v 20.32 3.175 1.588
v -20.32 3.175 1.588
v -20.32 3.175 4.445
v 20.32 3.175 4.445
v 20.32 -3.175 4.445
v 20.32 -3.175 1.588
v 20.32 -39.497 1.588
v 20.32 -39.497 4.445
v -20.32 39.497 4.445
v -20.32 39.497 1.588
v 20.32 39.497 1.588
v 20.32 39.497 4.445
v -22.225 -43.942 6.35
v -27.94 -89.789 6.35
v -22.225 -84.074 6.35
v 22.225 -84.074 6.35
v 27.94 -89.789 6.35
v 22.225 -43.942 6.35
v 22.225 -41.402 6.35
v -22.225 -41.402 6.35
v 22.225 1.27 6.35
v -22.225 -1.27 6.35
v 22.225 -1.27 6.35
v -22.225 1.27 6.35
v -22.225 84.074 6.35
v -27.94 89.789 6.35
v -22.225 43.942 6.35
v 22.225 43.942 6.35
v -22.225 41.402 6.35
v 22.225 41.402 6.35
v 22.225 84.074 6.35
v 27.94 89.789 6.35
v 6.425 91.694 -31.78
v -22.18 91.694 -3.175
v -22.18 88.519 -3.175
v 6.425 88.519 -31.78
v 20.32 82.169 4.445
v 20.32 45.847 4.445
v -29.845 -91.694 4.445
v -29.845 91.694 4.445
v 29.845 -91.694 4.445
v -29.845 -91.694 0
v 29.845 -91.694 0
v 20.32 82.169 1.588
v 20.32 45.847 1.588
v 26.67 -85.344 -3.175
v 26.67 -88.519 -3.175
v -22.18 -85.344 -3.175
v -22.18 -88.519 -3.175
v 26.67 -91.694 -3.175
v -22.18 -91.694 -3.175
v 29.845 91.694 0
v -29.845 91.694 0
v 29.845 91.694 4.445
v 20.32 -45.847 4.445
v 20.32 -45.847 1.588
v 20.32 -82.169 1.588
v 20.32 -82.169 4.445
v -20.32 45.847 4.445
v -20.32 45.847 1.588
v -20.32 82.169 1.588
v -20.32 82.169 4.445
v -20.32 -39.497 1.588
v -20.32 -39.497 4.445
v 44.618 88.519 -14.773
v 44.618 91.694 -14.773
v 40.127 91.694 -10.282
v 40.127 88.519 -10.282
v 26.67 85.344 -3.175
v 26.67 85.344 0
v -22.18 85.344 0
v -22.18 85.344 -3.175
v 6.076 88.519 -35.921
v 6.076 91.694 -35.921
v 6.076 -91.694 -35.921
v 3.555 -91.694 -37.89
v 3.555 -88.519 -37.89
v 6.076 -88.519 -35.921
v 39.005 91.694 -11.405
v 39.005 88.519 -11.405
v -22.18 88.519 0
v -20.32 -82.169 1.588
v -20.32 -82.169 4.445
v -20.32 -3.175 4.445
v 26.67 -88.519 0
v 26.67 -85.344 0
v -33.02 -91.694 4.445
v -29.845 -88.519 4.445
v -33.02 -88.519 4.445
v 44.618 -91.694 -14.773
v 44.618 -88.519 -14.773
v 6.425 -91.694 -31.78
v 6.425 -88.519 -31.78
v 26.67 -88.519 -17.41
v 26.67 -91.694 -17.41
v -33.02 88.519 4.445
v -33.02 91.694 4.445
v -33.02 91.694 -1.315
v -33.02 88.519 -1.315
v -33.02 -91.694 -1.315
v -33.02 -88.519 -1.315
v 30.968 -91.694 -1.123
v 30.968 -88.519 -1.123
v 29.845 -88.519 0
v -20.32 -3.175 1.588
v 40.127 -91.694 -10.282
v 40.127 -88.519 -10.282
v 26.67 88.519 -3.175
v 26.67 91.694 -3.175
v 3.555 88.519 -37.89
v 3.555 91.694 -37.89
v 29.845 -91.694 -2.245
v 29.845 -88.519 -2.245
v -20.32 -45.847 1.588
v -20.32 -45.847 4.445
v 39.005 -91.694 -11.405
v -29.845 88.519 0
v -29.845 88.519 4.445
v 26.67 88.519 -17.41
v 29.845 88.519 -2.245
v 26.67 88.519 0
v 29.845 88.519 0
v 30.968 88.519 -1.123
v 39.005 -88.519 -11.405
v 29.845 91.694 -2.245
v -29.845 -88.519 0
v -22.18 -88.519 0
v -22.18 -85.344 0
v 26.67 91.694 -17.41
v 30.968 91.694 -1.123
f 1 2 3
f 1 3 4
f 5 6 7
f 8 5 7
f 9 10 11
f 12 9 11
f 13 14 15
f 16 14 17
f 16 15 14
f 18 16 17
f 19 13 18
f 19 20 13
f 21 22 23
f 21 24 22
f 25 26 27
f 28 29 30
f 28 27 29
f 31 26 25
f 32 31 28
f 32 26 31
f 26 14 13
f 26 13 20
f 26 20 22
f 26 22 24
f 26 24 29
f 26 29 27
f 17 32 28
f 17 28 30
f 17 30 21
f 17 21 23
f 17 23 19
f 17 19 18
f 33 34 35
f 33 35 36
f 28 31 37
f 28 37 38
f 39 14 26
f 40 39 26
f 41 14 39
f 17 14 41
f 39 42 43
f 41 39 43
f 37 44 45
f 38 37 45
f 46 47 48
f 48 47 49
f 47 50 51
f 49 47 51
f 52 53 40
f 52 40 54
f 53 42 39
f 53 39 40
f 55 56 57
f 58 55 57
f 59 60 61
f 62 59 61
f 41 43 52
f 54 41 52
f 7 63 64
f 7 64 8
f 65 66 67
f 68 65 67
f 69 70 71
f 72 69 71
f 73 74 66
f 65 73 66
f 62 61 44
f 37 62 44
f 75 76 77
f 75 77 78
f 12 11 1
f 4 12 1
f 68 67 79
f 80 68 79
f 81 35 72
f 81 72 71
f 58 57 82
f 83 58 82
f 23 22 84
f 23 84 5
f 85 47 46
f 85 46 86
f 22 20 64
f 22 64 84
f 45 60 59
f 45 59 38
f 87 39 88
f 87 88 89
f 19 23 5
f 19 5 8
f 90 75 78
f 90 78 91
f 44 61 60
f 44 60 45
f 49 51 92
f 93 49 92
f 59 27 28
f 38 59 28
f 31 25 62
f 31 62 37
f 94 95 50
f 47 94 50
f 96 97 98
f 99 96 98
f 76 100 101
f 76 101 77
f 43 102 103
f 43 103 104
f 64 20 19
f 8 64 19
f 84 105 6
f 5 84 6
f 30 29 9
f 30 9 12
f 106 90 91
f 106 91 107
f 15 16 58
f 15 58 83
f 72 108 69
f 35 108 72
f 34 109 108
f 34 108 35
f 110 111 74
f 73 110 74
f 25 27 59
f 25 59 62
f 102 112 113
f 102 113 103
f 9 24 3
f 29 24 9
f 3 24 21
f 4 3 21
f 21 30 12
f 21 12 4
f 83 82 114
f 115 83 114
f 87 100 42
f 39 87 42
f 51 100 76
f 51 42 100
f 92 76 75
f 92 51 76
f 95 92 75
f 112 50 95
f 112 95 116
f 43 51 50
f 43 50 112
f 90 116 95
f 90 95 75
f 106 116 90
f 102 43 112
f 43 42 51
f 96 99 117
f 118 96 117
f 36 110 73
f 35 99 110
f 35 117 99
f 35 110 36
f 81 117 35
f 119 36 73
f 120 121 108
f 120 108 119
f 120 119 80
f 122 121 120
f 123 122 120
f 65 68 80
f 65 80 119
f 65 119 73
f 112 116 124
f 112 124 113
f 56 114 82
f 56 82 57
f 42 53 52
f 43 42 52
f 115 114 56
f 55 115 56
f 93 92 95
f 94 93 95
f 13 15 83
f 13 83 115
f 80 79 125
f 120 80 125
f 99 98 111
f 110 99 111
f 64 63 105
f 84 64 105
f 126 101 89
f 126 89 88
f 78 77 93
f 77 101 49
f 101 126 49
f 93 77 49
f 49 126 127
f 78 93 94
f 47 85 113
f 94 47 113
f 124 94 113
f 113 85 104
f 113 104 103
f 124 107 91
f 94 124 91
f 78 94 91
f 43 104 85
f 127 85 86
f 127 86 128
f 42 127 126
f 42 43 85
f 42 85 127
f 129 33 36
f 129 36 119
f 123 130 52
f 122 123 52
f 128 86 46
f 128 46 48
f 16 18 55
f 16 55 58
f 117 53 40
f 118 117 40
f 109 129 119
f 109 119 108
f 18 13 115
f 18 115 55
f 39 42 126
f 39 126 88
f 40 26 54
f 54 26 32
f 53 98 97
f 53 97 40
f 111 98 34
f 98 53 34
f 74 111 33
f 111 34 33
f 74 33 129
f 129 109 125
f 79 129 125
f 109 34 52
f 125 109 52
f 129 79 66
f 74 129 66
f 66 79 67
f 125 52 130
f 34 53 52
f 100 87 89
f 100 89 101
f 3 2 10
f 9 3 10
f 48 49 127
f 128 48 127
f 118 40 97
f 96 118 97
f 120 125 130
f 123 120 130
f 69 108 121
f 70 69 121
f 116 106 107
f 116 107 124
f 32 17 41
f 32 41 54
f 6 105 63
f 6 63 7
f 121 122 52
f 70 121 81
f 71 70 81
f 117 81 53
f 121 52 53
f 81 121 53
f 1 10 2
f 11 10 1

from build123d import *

# Parameters (mm, degrees)
F0_W     = 59.69
F0_H     = 183.388
F0_W_2   = 40.64
F0_H_2   = 6.35
F1_DEPTH = 6.35
F2_SIZE  = 1.905
F0_H_3   = 36.322
F3_DEPTH = 1.5875
F5_DEPTH = 3.175
F7_DEPTH = 25.4
F8_W     = 48.8498719395
F8_H     = 3.175
F9_DEPTH = 3.175


with BuildPart() as f1:
    # F0 (on Top) → F1 (new body)
    with BuildSketch(Plane.XY):
        Rectangle(F0_W, F0_H)
        Polygon((20.32, -45.847), (20.32, -82.169), (-20.32, -82.169), (-20.32, -45.847), (-20.32, -39.497), (-20.32, -3.175), (-20.32, 3.175), (-20.32, 39.497), (-20.32, 45.847), (-20.32, 82.169), (20.32, 82.169), (20.32, 45.847), (20.32, 39.497), (20.32, 3.175), (20.32, -3.175), (20.32, -39.497), align=None, mode=Mode.SUBTRACT)
        Rectangle(F0_W_2, F0_H_2)
        with Locations((0, -42.672)):
            Rectangle(F0_W_2, F0_H_2)
        with Locations((0, 42.672)):
            Rectangle(F0_W_2, F0_H_2)
    extrude(amount=F1_DEPTH)

    # F2
    f2_edges = [f1.edges().sort_by_distance(p)[0] for p in [
        (-29.845, 0, 6.35),
        (0, -91.694, 6.35),
        (29.845, 0, 6.35),
        (0, 91.694, 6.35),
        (0, -82.169, 6.35),
        (-20.32, -64.008, 6.35),
        (0, -45.847, 6.35),
        (20.32, -64.008, 6.35),
        (-20.32, -21.336, 6.35),
        (0, -3.175, 6.35),
        (20.32, -21.336, 6.35),
        (0, -39.497, 6.35),
        (-20.32, 21.336, 6.35),
        (0, 39.497, 6.35),
        (20.32, 21.336, 6.35),
        (0, 3.175, 6.35),
        (-20.32, 64.008, 6.35),
        (0, 82.169, 6.35),
        (20.32, 64.008, 6.35),
        (0, 45.847, 6.35),
    ]]
    chamfer(f2_edges, length=F2_SIZE)

    # F0 (on Top) → F3 (join)
    with BuildSketch(Plane.XY):
        with Locations((0, -64.008)):
            Rectangle(F0_W_2, F0_H_3)
        with Locations((0, -21.336)):
            Rectangle(F0_W_2, F0_H_3)
        with Locations((0, 21.336)):
            Rectangle(F0_W_2, F0_H_3)
        with Locations((0, 64.008)):
            Rectangle(F0_W_2, F0_H_3)
    extrude(amount=F3_DEPTH)


with BuildPart() as f5:
    # F4 (on face) → F5 (new body)
    with BuildSketch(Plane.XZ.offset(91.694)):
        Polygon((29.845, 0), (20.32, 0), (-20.32, 0), (-29.845, 0), (6.0760244843, -35.9210244843), (44.6175213192, -14.7725213192), (40.1273932586, -10.2823932586), (39.0048612435, -11.4049252738), (29.845, -2.2450640303), (30.9675320151, -1.1225320151), align=None)
        Polygon((6.0760244843, -35.9210244843), (-29.845, 0), (-29.845, 4.445), (-33.02, 4.445), (-33.02, -1.3151280605), (3.5546971341, -37.8898251946), align=None)
    extrude(amount=-F5_DEPTH)

    # F6 (on face) → F7 (cut)
    with BuildSketch(Plane.XZ.offset(91.694)):
        Polygon((6.424976296, -31.7798482355), (26.67, -17.4100959351), (26.67, -3.175), (-22.1798719395, -3.175), align=None)
    extrude(amount=-F7_DEPTH, mode=Mode.SUBTRACT)

    # F8 (on face) → F9 (join)
    with BuildSketch(Plane(origin=(0, -88.519, 0), x_dir=(-1, 0, 0), z_dir=(0, 1, 0))):
        with Locations((-2.2450640303, -1.5875)):
            Rectangle(F8_W, F8_H)
    extrude(amount=F9_DEPTH)


with BuildPart() as f10_1:
    # F10: instance of F5
    add(f5.part.mirror(Plane.XZ))


solid = Compound([f1.part, f5.part, f10_1.part])
